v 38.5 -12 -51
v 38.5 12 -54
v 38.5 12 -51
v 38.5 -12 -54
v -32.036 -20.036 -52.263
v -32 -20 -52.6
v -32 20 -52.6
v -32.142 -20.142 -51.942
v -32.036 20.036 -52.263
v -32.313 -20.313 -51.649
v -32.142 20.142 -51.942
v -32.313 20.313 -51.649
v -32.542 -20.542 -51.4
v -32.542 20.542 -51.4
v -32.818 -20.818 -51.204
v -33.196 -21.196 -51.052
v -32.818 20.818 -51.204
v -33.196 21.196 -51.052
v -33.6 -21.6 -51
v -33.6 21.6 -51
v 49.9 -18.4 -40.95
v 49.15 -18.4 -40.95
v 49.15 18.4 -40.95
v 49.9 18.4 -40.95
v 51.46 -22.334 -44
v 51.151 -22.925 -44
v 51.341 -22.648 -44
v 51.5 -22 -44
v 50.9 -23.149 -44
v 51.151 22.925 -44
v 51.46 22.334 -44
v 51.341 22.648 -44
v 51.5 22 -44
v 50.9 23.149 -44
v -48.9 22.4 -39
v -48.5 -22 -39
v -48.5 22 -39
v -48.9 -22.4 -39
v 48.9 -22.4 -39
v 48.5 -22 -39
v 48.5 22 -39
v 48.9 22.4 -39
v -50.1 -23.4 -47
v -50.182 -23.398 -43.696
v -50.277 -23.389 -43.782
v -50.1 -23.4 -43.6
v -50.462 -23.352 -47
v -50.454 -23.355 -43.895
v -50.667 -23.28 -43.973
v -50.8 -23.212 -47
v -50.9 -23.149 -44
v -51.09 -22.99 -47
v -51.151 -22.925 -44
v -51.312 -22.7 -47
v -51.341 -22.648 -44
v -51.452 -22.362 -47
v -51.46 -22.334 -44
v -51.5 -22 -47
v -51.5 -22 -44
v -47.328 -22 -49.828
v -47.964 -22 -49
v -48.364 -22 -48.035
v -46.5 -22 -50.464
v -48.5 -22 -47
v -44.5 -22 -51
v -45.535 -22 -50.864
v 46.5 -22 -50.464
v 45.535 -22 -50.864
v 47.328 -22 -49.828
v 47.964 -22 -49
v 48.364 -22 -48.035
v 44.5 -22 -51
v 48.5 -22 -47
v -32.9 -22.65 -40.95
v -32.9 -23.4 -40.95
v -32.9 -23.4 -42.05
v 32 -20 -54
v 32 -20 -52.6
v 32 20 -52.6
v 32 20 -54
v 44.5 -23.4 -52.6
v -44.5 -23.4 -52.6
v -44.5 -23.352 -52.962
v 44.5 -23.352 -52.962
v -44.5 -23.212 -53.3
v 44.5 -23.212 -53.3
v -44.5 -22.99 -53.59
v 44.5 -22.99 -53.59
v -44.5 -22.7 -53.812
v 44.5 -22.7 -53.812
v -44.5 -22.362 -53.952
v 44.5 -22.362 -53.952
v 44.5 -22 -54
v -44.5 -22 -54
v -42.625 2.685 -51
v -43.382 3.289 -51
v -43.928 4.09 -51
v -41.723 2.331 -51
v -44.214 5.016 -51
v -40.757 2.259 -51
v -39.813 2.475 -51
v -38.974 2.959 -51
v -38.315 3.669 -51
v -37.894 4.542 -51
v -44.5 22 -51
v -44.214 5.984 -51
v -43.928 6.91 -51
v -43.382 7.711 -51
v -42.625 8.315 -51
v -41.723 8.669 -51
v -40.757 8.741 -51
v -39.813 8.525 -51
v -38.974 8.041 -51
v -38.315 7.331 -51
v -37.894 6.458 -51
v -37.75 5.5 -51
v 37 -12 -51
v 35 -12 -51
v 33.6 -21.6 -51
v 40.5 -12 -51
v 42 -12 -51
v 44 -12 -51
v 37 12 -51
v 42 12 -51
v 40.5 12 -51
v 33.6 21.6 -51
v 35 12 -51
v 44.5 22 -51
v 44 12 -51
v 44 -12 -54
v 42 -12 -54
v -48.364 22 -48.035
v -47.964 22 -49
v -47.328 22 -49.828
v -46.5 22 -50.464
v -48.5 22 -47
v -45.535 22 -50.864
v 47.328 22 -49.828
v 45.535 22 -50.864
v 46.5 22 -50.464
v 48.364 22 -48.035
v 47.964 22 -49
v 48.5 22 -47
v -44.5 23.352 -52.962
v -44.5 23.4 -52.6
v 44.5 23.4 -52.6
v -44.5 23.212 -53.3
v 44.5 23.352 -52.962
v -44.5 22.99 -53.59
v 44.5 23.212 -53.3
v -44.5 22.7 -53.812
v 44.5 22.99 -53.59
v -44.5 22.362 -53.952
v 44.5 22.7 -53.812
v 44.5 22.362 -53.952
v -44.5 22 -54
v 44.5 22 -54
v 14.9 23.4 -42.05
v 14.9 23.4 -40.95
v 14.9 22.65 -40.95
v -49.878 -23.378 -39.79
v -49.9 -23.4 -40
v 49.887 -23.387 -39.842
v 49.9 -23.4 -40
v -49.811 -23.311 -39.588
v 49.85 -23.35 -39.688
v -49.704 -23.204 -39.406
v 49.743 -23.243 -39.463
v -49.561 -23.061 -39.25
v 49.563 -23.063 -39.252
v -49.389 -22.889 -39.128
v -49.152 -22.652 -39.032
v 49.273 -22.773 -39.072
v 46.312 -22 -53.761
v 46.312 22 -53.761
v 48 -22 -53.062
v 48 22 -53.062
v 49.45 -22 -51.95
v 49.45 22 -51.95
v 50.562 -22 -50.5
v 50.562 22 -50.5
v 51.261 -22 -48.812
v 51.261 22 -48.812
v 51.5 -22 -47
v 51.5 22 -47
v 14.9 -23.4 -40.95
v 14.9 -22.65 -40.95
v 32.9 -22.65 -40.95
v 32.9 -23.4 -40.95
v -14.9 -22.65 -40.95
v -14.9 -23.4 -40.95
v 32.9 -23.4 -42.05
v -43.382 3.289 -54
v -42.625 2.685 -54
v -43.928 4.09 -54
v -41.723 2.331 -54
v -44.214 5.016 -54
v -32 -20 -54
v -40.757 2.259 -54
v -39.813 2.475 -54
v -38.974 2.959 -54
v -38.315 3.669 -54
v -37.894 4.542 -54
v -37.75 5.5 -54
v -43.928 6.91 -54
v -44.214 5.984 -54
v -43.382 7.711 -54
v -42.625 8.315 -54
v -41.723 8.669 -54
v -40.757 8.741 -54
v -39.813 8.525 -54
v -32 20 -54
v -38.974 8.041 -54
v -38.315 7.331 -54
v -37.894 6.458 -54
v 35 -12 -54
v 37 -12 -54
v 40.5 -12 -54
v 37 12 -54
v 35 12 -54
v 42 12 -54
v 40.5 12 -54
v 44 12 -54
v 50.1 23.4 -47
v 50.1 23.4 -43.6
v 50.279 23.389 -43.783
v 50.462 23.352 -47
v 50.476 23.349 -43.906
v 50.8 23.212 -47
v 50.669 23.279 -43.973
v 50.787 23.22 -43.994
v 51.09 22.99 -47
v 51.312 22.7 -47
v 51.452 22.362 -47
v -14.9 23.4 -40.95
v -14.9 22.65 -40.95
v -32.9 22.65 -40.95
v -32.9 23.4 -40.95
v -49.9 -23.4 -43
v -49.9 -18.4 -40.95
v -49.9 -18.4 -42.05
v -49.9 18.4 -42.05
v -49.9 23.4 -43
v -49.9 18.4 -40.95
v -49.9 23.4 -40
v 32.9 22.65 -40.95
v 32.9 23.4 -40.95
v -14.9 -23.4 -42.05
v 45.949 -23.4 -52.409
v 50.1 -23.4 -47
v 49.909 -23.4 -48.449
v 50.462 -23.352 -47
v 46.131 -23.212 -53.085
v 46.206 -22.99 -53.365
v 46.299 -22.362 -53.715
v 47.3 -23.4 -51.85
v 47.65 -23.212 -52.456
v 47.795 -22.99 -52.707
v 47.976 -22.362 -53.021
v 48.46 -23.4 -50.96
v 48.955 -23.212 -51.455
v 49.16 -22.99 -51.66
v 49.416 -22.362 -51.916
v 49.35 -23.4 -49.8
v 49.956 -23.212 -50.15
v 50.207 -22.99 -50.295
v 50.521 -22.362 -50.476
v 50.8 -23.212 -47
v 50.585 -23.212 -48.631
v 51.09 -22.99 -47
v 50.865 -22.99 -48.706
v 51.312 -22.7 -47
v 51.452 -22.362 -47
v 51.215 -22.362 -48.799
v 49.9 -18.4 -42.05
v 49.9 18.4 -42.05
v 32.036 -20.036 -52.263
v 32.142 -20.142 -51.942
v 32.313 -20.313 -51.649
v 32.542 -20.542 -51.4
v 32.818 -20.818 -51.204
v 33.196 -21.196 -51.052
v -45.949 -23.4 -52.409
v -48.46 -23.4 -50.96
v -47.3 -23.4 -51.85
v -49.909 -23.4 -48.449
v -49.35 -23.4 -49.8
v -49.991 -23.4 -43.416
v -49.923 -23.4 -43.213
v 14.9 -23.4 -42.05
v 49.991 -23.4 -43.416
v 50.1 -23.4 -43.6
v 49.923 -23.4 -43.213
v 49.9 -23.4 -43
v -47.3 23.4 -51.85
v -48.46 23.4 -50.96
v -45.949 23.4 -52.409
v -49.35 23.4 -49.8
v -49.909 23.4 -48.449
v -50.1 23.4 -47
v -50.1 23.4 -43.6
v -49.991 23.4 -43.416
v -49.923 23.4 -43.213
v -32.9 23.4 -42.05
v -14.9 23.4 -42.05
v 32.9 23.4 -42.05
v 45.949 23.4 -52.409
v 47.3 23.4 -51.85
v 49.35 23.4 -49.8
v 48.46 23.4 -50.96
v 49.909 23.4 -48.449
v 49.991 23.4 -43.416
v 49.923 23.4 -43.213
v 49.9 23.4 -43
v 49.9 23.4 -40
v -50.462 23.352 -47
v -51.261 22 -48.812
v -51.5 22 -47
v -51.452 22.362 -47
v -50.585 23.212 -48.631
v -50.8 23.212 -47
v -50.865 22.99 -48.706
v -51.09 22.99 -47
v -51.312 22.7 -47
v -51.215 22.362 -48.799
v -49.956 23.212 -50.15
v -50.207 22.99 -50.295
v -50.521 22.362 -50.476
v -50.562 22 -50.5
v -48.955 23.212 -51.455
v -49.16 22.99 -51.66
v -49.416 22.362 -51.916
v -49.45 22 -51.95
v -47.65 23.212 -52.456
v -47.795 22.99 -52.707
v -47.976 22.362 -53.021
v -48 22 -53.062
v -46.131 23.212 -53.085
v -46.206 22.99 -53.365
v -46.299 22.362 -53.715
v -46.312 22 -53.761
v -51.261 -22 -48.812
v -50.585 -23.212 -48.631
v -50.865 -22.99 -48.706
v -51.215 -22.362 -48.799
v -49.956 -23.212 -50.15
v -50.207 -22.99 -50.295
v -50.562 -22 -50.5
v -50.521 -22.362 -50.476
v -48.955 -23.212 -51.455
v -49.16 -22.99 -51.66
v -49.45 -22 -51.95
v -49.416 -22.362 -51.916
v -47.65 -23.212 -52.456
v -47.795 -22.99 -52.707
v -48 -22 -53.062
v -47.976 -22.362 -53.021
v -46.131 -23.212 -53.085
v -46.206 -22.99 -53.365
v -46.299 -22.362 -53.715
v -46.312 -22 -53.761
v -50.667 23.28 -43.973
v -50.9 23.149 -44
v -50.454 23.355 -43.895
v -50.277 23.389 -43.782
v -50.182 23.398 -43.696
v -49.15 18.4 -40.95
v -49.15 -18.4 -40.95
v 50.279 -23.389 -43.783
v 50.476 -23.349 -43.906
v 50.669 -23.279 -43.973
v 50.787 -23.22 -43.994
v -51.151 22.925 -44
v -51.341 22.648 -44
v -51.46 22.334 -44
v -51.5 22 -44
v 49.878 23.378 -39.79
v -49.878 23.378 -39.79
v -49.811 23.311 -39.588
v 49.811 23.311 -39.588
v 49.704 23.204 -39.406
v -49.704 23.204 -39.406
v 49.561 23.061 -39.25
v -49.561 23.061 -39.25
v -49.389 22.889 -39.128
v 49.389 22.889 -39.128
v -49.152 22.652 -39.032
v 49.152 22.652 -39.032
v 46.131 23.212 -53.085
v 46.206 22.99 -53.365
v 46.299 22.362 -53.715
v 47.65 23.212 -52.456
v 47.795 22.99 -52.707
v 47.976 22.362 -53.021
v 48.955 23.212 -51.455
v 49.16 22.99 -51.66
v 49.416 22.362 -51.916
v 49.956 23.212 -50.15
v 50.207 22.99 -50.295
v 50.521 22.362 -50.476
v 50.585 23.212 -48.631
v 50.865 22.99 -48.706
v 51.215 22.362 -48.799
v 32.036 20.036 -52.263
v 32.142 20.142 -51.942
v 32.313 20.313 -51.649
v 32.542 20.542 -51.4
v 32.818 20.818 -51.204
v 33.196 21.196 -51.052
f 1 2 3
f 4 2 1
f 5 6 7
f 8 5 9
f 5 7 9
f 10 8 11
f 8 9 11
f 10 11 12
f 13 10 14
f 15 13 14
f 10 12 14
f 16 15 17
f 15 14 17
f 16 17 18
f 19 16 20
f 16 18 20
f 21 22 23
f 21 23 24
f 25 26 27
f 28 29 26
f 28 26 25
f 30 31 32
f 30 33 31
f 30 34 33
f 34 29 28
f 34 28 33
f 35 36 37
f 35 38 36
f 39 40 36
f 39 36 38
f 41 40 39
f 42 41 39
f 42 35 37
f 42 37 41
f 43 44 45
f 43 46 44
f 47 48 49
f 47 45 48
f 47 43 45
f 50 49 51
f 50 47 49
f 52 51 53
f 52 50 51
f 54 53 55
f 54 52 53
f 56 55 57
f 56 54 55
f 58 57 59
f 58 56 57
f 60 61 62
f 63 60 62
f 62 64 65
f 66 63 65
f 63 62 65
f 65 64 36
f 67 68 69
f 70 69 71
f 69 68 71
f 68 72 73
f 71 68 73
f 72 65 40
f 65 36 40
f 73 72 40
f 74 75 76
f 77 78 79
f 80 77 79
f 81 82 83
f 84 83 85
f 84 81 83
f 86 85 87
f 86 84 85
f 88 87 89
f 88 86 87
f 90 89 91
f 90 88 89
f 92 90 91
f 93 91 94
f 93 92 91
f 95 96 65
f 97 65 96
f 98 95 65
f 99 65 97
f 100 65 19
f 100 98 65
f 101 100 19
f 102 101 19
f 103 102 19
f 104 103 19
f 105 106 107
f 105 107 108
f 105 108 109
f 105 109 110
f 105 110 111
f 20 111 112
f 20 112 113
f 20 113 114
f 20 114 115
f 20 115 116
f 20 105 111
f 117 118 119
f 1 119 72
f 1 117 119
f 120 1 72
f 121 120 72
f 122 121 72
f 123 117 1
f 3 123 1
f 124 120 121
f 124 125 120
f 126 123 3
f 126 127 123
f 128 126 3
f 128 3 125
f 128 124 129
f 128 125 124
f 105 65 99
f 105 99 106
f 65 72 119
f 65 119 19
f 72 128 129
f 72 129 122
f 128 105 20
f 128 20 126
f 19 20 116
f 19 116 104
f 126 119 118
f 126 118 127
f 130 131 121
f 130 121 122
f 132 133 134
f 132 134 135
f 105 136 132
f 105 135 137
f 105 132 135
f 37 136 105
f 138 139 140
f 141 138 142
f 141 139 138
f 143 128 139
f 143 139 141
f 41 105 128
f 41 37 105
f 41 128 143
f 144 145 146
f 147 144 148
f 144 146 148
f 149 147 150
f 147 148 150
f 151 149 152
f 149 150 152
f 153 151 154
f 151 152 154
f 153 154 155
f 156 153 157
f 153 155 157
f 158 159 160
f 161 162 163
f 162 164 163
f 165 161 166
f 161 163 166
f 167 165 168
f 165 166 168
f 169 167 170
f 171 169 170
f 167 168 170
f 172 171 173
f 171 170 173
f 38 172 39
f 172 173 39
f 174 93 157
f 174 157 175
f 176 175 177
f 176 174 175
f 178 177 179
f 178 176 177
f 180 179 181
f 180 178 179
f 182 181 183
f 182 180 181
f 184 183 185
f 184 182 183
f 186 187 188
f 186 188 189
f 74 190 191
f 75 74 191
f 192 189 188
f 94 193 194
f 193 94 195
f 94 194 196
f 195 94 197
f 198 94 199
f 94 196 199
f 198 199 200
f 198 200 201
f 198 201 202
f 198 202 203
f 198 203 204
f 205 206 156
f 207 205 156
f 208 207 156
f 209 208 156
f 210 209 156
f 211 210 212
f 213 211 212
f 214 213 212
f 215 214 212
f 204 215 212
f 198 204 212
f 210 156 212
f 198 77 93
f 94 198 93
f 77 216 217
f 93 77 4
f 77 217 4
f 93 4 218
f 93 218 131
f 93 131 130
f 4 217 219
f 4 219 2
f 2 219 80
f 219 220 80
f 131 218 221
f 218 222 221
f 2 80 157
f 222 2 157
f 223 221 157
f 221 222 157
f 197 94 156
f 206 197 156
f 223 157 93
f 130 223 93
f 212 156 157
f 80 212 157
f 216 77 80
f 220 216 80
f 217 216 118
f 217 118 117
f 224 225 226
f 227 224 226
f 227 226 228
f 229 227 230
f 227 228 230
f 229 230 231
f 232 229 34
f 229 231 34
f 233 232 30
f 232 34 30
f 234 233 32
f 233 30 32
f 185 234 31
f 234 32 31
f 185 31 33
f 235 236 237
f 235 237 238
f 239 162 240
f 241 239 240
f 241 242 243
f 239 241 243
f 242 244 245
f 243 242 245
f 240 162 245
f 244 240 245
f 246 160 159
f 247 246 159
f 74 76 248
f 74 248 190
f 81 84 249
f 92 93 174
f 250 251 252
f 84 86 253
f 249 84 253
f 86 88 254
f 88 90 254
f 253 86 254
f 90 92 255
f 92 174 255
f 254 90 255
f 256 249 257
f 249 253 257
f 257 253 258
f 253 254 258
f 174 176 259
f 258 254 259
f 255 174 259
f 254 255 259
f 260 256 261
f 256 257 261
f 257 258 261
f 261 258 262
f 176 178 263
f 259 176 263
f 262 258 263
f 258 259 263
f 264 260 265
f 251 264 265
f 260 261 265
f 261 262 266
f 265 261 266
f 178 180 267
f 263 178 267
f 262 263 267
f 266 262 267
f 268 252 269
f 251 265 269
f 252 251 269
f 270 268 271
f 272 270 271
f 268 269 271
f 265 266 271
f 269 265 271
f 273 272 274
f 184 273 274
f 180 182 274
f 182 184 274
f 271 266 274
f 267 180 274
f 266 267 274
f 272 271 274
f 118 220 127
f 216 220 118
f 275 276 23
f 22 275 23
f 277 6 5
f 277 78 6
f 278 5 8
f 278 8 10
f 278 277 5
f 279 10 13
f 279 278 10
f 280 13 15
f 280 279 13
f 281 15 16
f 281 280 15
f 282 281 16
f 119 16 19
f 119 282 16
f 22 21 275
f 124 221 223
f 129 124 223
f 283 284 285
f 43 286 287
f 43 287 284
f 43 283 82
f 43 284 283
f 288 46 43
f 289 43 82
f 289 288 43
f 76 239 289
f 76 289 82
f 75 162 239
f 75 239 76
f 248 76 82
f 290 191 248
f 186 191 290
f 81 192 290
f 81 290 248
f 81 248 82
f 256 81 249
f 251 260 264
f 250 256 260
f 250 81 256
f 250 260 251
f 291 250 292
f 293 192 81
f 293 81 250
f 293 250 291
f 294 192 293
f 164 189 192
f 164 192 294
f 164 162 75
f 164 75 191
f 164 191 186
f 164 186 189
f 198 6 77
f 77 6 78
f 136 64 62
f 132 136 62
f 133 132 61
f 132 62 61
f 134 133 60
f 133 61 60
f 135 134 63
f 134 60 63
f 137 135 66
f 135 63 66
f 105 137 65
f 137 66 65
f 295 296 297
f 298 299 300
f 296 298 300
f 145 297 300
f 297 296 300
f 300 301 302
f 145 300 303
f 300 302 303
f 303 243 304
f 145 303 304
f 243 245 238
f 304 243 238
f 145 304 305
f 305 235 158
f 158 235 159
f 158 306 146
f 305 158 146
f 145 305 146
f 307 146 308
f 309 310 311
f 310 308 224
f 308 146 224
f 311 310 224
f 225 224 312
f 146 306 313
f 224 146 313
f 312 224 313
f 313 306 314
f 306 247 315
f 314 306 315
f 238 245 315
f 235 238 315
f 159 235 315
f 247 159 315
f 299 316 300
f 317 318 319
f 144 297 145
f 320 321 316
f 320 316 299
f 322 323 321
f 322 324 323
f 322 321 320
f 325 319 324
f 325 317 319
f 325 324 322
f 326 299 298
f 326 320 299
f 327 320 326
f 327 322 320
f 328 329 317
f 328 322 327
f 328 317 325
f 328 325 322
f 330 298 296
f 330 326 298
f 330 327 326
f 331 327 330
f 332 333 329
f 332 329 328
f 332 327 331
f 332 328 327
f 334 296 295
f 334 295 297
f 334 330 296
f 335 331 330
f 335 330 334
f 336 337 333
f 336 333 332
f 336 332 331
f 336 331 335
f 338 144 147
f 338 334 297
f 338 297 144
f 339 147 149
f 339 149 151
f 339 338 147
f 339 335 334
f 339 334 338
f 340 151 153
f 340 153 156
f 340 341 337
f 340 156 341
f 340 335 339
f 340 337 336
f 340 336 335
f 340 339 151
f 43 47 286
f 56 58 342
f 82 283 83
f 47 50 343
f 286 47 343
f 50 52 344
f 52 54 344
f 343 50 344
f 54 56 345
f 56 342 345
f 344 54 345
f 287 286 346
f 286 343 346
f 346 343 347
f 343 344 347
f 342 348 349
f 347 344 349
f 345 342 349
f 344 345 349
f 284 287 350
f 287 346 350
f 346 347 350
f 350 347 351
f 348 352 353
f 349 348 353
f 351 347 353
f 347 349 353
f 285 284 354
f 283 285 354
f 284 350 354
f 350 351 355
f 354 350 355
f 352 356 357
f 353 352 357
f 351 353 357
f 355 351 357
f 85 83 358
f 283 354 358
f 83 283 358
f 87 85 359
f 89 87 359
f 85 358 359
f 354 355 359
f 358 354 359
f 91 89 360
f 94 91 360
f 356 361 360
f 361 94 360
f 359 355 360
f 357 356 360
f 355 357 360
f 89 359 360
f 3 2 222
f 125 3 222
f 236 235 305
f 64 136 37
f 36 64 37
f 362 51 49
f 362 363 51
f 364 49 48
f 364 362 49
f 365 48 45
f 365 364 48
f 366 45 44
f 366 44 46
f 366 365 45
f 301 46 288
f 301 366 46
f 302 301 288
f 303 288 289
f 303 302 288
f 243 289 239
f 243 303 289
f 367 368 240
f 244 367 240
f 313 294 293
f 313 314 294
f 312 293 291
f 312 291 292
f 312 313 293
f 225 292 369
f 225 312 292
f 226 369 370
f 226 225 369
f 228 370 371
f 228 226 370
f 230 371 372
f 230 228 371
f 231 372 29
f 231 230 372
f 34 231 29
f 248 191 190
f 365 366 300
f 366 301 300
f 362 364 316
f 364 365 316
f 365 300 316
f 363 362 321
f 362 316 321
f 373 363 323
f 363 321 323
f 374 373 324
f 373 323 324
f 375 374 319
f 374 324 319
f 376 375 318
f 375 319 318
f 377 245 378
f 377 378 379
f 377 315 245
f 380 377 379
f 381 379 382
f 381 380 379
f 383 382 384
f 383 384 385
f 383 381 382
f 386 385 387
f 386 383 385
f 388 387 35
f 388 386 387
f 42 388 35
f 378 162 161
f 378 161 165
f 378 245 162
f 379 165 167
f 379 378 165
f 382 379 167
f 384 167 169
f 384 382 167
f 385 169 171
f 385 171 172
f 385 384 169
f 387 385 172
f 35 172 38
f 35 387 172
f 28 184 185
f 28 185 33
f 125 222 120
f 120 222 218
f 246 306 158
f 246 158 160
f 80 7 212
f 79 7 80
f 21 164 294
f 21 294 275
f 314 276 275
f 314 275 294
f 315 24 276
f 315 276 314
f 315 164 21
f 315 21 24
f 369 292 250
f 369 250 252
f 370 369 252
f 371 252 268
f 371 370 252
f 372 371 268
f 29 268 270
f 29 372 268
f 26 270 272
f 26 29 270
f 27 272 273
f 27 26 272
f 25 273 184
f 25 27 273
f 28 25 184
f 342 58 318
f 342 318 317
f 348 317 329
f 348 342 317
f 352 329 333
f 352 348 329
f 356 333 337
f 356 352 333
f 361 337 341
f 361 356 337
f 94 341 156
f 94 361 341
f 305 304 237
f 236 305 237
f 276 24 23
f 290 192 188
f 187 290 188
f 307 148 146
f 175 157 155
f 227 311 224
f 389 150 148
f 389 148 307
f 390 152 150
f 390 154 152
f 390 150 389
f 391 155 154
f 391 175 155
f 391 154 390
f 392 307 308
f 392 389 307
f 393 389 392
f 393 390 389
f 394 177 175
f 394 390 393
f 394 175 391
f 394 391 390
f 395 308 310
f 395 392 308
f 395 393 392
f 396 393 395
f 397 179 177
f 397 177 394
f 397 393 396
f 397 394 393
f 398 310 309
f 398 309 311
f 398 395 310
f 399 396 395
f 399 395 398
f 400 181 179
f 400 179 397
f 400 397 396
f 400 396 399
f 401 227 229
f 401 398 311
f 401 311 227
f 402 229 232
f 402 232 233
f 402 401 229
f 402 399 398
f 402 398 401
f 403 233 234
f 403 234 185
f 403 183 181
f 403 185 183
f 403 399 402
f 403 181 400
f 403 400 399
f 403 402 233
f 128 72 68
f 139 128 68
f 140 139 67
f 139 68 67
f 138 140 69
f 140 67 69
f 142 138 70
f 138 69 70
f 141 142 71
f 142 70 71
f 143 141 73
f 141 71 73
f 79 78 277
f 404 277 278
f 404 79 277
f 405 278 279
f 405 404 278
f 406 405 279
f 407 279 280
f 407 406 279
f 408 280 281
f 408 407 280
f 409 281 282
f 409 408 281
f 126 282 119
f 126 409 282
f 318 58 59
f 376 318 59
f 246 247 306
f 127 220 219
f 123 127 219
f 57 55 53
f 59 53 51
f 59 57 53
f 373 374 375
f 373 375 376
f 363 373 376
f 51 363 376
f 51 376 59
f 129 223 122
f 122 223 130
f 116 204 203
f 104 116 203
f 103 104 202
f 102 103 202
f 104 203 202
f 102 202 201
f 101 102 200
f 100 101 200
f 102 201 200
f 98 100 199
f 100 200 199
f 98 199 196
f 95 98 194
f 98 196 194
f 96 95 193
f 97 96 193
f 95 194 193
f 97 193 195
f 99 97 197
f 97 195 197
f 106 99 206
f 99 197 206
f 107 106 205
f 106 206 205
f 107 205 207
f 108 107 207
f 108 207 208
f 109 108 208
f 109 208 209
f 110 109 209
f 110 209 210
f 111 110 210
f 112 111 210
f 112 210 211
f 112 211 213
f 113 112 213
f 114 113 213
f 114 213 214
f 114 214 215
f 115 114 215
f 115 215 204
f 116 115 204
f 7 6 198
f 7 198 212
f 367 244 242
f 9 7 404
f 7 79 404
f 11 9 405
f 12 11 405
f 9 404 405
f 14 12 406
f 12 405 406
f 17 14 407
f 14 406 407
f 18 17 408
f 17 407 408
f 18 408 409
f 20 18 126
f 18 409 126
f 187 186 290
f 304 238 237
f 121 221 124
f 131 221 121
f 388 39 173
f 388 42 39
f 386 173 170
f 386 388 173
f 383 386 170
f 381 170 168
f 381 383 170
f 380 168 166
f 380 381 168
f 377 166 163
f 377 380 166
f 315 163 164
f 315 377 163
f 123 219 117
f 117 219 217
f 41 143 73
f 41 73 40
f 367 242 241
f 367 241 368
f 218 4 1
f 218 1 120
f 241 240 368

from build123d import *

# Parameters (mm, degrees)
SKETCH010_W       = 103
SKETCH010_H       = 15
PAD005_DEPTH      = 25
PAD005_DEPTH_BACK = 25
FILLET004_R       = 7
THICKNESS001_T    = -3
SKETCH011_W       = 64
SKETCH011_H       = 40
POCKET002_DEPTH   = 3.001
SKETCH012_W       = 103
SKETCH012_H       = 50
SKETCH012_W_2     = 99.8
SKETCH012_H_2     = 46.8
POCKET003_DEPTH   = 5
SKETCH111_W       = 103
SKETCH111_H       = 1.6
POCKET046_DEPTH   = 10.001
FILLET005_R       = 1.4
FILLET042_R       = 1
SKETCH052_R       = 3.25
SKETCH052_W       = 2
SKETCH052_H       = 24
POCKET021_DEPTH   = 15.001
POCKET_START      = -5
POCKET_DEPTH      = 36.8
POCKET044_START   = -17
POCKET044_DEPTH   = 18
FILLET052_R       = 1.6


with BuildPart() as part:
    # Sketch010 → Pad005 (new body, two sides)
    with BuildSketch(Plane.XZ) as pad005_sk:
        Rectangle(SKETCH010_W, SKETCH010_H)
    extrude(amount=-PAD005_DEPTH)
    extrude(pad005_sk.sketch, amount=PAD005_DEPTH_BACK)

    # Fillet004
    fillet004_edges = [part.edges().sort_by_distance(p)[0] for p in [
        (-51.5, 0, -7.5),
        (51.5, 0, -7.5),
    ]]
    fillet(fillet004_edges, radius=FILLET004_R)

    # Thickness001
    thickness001_openings = [part.faces().sort_by_distance(p)[0] for p in [
        (0, 0, 7.5),
    ]]
    offset(amount=THICKNESS001_T, openings=thickness001_openings)

    # Sketch011 (on Face15 of Thickness001) → Pocket002 (cut, through all)
    with BuildSketch(Plane.XY.offset(-4.5)):
        Rectangle(SKETCH011_W, SKETCH011_H)
    extrude(amount=-POCKET002_DEPTH, mode=Mode.SUBTRACT)

    # Sketch012 (on Face4 of Pocket002) → Pocket003 (cut)
    with BuildSketch(Plane.XY.offset(7.5)):
        Rectangle(SKETCH012_W, SKETCH012_H)
        Rectangle(SKETCH012_W_2, SKETCH012_H_2, mode=Mode.SUBTRACT)
    extrude(amount=-POCKET003_DEPTH, mode=Mode.SUBTRACT)

    # Sketch111 (on Face5 of Pocket003) → Pocket046 (cut, through all)
    with BuildSketch(Plane.XY.offset(2.5)):
        with Locations((0, -24.2)):
            Rectangle(SKETCH111_W, SKETCH111_H)
        with Locations((0, 24.2)):
            Rectangle(SKETCH111_W, SKETCH111_H)
    extrude(amount=-POCKET046_DEPTH, mode=Mode.SUBTRACT)

    # Fillet005
    fillet005_edges = [part.edges().sort_by_distance(p)[0] for p in [
        (-51.5, 0, -0.5),
        (0, -23.4, -7.5),
        (-44.5, 0, -7.5),
        (0, 23.4, -7.5),
    ]]
    fillet(fillet005_edges, radius=FILLET005_R)

    # Fillet042
    fillet042_edges = [part.edges().sort_by_distance(p)[0] for p in [
        (0, 23.4, 7.5),
        (49.9, 0, 7.5),
        (-49.9, 0, 7.5),
        (-49.9, 0, 2.5),
        (49.9, 0, 2.5),
        (0, -23.4, 7.5),
    ]]
    fillet(fillet042_edges, radius=FILLET042_R)

    # Sketch052 (on Face20 of Fillet005) → Pocket021 (cut, through all)
    with BuildSketch(Plane(origin=(0, 0, -7.5), x_dir=(1, 0, 0), z_dir=(0, 0, -1))):
        with Locations((-41, -5.5)):
            Circle(SKETCH052_R)
        with Locations((36, 0)):
            Rectangle(SKETCH052_W, SKETCH052_H)
        with Locations((39.5, 0)):
            Rectangle(SKETCH052_W, SKETCH052_H)
        with Locations((43, 0)):
            Rectangle(SKETCH052_W, SKETCH052_H)
    extrude(amount=-POCKET021_DEPTH, mode=Mode.SUBTRACT)

    # Sketch013 (on Face10 of Pocket003) → Pocket (cut)
    with BuildSketch(Plane.XZ.offset(23.4).offset(POCKET_START)):
        Polygon((49.9, 5.55), (49.9, 4.45), (49.15, 5.55), align=None)
        Polygon((-49.15, 5.55), (-49.9, 5.55), (-49.9, 4.45), align=None)
    extrude(amount=-POCKET_DEPTH, mode=Mode.SUBTRACT)

    # Sketch014 (on Face8 of Fillet042) → Pocket044 (cut)
    with BuildSketch(Plane.YZ.offset(49.9).offset(POCKET044_START)):
        Polygon((23.4, 5.55), (23.4, 4.45), (22.65, 5.55), align=None)
        Polygon((-23.4, 5.55), (-23.4, 4.45), (-22.65, 5.55), align=None)
    pocket044 = extrude(amount=-POCKET044_DEPTH, mode=Mode.SUBTRACT)

    # Mirrored011: Pocket044 across YZ
    add(pocket044.mirror(Plane.YZ), mode=Mode.SUBTRACT)

    # Fillet052
    fillet052_edges = [part.edges().sort_by_distance(p)[0] for p in [
        (-32, 0, -4.5),
        (0, 20, -4.5),
        (32, 0, -4.5),
        (0, -20, -4.5),
    ]]
    fillet(fillet052_edges, radius=FILLET052_R)


with BuildPart() as part_1:
    # Body002 placement: moved
    add(part.part.moved(Location((0, 0, -46.5))))


solid = part_1.part
